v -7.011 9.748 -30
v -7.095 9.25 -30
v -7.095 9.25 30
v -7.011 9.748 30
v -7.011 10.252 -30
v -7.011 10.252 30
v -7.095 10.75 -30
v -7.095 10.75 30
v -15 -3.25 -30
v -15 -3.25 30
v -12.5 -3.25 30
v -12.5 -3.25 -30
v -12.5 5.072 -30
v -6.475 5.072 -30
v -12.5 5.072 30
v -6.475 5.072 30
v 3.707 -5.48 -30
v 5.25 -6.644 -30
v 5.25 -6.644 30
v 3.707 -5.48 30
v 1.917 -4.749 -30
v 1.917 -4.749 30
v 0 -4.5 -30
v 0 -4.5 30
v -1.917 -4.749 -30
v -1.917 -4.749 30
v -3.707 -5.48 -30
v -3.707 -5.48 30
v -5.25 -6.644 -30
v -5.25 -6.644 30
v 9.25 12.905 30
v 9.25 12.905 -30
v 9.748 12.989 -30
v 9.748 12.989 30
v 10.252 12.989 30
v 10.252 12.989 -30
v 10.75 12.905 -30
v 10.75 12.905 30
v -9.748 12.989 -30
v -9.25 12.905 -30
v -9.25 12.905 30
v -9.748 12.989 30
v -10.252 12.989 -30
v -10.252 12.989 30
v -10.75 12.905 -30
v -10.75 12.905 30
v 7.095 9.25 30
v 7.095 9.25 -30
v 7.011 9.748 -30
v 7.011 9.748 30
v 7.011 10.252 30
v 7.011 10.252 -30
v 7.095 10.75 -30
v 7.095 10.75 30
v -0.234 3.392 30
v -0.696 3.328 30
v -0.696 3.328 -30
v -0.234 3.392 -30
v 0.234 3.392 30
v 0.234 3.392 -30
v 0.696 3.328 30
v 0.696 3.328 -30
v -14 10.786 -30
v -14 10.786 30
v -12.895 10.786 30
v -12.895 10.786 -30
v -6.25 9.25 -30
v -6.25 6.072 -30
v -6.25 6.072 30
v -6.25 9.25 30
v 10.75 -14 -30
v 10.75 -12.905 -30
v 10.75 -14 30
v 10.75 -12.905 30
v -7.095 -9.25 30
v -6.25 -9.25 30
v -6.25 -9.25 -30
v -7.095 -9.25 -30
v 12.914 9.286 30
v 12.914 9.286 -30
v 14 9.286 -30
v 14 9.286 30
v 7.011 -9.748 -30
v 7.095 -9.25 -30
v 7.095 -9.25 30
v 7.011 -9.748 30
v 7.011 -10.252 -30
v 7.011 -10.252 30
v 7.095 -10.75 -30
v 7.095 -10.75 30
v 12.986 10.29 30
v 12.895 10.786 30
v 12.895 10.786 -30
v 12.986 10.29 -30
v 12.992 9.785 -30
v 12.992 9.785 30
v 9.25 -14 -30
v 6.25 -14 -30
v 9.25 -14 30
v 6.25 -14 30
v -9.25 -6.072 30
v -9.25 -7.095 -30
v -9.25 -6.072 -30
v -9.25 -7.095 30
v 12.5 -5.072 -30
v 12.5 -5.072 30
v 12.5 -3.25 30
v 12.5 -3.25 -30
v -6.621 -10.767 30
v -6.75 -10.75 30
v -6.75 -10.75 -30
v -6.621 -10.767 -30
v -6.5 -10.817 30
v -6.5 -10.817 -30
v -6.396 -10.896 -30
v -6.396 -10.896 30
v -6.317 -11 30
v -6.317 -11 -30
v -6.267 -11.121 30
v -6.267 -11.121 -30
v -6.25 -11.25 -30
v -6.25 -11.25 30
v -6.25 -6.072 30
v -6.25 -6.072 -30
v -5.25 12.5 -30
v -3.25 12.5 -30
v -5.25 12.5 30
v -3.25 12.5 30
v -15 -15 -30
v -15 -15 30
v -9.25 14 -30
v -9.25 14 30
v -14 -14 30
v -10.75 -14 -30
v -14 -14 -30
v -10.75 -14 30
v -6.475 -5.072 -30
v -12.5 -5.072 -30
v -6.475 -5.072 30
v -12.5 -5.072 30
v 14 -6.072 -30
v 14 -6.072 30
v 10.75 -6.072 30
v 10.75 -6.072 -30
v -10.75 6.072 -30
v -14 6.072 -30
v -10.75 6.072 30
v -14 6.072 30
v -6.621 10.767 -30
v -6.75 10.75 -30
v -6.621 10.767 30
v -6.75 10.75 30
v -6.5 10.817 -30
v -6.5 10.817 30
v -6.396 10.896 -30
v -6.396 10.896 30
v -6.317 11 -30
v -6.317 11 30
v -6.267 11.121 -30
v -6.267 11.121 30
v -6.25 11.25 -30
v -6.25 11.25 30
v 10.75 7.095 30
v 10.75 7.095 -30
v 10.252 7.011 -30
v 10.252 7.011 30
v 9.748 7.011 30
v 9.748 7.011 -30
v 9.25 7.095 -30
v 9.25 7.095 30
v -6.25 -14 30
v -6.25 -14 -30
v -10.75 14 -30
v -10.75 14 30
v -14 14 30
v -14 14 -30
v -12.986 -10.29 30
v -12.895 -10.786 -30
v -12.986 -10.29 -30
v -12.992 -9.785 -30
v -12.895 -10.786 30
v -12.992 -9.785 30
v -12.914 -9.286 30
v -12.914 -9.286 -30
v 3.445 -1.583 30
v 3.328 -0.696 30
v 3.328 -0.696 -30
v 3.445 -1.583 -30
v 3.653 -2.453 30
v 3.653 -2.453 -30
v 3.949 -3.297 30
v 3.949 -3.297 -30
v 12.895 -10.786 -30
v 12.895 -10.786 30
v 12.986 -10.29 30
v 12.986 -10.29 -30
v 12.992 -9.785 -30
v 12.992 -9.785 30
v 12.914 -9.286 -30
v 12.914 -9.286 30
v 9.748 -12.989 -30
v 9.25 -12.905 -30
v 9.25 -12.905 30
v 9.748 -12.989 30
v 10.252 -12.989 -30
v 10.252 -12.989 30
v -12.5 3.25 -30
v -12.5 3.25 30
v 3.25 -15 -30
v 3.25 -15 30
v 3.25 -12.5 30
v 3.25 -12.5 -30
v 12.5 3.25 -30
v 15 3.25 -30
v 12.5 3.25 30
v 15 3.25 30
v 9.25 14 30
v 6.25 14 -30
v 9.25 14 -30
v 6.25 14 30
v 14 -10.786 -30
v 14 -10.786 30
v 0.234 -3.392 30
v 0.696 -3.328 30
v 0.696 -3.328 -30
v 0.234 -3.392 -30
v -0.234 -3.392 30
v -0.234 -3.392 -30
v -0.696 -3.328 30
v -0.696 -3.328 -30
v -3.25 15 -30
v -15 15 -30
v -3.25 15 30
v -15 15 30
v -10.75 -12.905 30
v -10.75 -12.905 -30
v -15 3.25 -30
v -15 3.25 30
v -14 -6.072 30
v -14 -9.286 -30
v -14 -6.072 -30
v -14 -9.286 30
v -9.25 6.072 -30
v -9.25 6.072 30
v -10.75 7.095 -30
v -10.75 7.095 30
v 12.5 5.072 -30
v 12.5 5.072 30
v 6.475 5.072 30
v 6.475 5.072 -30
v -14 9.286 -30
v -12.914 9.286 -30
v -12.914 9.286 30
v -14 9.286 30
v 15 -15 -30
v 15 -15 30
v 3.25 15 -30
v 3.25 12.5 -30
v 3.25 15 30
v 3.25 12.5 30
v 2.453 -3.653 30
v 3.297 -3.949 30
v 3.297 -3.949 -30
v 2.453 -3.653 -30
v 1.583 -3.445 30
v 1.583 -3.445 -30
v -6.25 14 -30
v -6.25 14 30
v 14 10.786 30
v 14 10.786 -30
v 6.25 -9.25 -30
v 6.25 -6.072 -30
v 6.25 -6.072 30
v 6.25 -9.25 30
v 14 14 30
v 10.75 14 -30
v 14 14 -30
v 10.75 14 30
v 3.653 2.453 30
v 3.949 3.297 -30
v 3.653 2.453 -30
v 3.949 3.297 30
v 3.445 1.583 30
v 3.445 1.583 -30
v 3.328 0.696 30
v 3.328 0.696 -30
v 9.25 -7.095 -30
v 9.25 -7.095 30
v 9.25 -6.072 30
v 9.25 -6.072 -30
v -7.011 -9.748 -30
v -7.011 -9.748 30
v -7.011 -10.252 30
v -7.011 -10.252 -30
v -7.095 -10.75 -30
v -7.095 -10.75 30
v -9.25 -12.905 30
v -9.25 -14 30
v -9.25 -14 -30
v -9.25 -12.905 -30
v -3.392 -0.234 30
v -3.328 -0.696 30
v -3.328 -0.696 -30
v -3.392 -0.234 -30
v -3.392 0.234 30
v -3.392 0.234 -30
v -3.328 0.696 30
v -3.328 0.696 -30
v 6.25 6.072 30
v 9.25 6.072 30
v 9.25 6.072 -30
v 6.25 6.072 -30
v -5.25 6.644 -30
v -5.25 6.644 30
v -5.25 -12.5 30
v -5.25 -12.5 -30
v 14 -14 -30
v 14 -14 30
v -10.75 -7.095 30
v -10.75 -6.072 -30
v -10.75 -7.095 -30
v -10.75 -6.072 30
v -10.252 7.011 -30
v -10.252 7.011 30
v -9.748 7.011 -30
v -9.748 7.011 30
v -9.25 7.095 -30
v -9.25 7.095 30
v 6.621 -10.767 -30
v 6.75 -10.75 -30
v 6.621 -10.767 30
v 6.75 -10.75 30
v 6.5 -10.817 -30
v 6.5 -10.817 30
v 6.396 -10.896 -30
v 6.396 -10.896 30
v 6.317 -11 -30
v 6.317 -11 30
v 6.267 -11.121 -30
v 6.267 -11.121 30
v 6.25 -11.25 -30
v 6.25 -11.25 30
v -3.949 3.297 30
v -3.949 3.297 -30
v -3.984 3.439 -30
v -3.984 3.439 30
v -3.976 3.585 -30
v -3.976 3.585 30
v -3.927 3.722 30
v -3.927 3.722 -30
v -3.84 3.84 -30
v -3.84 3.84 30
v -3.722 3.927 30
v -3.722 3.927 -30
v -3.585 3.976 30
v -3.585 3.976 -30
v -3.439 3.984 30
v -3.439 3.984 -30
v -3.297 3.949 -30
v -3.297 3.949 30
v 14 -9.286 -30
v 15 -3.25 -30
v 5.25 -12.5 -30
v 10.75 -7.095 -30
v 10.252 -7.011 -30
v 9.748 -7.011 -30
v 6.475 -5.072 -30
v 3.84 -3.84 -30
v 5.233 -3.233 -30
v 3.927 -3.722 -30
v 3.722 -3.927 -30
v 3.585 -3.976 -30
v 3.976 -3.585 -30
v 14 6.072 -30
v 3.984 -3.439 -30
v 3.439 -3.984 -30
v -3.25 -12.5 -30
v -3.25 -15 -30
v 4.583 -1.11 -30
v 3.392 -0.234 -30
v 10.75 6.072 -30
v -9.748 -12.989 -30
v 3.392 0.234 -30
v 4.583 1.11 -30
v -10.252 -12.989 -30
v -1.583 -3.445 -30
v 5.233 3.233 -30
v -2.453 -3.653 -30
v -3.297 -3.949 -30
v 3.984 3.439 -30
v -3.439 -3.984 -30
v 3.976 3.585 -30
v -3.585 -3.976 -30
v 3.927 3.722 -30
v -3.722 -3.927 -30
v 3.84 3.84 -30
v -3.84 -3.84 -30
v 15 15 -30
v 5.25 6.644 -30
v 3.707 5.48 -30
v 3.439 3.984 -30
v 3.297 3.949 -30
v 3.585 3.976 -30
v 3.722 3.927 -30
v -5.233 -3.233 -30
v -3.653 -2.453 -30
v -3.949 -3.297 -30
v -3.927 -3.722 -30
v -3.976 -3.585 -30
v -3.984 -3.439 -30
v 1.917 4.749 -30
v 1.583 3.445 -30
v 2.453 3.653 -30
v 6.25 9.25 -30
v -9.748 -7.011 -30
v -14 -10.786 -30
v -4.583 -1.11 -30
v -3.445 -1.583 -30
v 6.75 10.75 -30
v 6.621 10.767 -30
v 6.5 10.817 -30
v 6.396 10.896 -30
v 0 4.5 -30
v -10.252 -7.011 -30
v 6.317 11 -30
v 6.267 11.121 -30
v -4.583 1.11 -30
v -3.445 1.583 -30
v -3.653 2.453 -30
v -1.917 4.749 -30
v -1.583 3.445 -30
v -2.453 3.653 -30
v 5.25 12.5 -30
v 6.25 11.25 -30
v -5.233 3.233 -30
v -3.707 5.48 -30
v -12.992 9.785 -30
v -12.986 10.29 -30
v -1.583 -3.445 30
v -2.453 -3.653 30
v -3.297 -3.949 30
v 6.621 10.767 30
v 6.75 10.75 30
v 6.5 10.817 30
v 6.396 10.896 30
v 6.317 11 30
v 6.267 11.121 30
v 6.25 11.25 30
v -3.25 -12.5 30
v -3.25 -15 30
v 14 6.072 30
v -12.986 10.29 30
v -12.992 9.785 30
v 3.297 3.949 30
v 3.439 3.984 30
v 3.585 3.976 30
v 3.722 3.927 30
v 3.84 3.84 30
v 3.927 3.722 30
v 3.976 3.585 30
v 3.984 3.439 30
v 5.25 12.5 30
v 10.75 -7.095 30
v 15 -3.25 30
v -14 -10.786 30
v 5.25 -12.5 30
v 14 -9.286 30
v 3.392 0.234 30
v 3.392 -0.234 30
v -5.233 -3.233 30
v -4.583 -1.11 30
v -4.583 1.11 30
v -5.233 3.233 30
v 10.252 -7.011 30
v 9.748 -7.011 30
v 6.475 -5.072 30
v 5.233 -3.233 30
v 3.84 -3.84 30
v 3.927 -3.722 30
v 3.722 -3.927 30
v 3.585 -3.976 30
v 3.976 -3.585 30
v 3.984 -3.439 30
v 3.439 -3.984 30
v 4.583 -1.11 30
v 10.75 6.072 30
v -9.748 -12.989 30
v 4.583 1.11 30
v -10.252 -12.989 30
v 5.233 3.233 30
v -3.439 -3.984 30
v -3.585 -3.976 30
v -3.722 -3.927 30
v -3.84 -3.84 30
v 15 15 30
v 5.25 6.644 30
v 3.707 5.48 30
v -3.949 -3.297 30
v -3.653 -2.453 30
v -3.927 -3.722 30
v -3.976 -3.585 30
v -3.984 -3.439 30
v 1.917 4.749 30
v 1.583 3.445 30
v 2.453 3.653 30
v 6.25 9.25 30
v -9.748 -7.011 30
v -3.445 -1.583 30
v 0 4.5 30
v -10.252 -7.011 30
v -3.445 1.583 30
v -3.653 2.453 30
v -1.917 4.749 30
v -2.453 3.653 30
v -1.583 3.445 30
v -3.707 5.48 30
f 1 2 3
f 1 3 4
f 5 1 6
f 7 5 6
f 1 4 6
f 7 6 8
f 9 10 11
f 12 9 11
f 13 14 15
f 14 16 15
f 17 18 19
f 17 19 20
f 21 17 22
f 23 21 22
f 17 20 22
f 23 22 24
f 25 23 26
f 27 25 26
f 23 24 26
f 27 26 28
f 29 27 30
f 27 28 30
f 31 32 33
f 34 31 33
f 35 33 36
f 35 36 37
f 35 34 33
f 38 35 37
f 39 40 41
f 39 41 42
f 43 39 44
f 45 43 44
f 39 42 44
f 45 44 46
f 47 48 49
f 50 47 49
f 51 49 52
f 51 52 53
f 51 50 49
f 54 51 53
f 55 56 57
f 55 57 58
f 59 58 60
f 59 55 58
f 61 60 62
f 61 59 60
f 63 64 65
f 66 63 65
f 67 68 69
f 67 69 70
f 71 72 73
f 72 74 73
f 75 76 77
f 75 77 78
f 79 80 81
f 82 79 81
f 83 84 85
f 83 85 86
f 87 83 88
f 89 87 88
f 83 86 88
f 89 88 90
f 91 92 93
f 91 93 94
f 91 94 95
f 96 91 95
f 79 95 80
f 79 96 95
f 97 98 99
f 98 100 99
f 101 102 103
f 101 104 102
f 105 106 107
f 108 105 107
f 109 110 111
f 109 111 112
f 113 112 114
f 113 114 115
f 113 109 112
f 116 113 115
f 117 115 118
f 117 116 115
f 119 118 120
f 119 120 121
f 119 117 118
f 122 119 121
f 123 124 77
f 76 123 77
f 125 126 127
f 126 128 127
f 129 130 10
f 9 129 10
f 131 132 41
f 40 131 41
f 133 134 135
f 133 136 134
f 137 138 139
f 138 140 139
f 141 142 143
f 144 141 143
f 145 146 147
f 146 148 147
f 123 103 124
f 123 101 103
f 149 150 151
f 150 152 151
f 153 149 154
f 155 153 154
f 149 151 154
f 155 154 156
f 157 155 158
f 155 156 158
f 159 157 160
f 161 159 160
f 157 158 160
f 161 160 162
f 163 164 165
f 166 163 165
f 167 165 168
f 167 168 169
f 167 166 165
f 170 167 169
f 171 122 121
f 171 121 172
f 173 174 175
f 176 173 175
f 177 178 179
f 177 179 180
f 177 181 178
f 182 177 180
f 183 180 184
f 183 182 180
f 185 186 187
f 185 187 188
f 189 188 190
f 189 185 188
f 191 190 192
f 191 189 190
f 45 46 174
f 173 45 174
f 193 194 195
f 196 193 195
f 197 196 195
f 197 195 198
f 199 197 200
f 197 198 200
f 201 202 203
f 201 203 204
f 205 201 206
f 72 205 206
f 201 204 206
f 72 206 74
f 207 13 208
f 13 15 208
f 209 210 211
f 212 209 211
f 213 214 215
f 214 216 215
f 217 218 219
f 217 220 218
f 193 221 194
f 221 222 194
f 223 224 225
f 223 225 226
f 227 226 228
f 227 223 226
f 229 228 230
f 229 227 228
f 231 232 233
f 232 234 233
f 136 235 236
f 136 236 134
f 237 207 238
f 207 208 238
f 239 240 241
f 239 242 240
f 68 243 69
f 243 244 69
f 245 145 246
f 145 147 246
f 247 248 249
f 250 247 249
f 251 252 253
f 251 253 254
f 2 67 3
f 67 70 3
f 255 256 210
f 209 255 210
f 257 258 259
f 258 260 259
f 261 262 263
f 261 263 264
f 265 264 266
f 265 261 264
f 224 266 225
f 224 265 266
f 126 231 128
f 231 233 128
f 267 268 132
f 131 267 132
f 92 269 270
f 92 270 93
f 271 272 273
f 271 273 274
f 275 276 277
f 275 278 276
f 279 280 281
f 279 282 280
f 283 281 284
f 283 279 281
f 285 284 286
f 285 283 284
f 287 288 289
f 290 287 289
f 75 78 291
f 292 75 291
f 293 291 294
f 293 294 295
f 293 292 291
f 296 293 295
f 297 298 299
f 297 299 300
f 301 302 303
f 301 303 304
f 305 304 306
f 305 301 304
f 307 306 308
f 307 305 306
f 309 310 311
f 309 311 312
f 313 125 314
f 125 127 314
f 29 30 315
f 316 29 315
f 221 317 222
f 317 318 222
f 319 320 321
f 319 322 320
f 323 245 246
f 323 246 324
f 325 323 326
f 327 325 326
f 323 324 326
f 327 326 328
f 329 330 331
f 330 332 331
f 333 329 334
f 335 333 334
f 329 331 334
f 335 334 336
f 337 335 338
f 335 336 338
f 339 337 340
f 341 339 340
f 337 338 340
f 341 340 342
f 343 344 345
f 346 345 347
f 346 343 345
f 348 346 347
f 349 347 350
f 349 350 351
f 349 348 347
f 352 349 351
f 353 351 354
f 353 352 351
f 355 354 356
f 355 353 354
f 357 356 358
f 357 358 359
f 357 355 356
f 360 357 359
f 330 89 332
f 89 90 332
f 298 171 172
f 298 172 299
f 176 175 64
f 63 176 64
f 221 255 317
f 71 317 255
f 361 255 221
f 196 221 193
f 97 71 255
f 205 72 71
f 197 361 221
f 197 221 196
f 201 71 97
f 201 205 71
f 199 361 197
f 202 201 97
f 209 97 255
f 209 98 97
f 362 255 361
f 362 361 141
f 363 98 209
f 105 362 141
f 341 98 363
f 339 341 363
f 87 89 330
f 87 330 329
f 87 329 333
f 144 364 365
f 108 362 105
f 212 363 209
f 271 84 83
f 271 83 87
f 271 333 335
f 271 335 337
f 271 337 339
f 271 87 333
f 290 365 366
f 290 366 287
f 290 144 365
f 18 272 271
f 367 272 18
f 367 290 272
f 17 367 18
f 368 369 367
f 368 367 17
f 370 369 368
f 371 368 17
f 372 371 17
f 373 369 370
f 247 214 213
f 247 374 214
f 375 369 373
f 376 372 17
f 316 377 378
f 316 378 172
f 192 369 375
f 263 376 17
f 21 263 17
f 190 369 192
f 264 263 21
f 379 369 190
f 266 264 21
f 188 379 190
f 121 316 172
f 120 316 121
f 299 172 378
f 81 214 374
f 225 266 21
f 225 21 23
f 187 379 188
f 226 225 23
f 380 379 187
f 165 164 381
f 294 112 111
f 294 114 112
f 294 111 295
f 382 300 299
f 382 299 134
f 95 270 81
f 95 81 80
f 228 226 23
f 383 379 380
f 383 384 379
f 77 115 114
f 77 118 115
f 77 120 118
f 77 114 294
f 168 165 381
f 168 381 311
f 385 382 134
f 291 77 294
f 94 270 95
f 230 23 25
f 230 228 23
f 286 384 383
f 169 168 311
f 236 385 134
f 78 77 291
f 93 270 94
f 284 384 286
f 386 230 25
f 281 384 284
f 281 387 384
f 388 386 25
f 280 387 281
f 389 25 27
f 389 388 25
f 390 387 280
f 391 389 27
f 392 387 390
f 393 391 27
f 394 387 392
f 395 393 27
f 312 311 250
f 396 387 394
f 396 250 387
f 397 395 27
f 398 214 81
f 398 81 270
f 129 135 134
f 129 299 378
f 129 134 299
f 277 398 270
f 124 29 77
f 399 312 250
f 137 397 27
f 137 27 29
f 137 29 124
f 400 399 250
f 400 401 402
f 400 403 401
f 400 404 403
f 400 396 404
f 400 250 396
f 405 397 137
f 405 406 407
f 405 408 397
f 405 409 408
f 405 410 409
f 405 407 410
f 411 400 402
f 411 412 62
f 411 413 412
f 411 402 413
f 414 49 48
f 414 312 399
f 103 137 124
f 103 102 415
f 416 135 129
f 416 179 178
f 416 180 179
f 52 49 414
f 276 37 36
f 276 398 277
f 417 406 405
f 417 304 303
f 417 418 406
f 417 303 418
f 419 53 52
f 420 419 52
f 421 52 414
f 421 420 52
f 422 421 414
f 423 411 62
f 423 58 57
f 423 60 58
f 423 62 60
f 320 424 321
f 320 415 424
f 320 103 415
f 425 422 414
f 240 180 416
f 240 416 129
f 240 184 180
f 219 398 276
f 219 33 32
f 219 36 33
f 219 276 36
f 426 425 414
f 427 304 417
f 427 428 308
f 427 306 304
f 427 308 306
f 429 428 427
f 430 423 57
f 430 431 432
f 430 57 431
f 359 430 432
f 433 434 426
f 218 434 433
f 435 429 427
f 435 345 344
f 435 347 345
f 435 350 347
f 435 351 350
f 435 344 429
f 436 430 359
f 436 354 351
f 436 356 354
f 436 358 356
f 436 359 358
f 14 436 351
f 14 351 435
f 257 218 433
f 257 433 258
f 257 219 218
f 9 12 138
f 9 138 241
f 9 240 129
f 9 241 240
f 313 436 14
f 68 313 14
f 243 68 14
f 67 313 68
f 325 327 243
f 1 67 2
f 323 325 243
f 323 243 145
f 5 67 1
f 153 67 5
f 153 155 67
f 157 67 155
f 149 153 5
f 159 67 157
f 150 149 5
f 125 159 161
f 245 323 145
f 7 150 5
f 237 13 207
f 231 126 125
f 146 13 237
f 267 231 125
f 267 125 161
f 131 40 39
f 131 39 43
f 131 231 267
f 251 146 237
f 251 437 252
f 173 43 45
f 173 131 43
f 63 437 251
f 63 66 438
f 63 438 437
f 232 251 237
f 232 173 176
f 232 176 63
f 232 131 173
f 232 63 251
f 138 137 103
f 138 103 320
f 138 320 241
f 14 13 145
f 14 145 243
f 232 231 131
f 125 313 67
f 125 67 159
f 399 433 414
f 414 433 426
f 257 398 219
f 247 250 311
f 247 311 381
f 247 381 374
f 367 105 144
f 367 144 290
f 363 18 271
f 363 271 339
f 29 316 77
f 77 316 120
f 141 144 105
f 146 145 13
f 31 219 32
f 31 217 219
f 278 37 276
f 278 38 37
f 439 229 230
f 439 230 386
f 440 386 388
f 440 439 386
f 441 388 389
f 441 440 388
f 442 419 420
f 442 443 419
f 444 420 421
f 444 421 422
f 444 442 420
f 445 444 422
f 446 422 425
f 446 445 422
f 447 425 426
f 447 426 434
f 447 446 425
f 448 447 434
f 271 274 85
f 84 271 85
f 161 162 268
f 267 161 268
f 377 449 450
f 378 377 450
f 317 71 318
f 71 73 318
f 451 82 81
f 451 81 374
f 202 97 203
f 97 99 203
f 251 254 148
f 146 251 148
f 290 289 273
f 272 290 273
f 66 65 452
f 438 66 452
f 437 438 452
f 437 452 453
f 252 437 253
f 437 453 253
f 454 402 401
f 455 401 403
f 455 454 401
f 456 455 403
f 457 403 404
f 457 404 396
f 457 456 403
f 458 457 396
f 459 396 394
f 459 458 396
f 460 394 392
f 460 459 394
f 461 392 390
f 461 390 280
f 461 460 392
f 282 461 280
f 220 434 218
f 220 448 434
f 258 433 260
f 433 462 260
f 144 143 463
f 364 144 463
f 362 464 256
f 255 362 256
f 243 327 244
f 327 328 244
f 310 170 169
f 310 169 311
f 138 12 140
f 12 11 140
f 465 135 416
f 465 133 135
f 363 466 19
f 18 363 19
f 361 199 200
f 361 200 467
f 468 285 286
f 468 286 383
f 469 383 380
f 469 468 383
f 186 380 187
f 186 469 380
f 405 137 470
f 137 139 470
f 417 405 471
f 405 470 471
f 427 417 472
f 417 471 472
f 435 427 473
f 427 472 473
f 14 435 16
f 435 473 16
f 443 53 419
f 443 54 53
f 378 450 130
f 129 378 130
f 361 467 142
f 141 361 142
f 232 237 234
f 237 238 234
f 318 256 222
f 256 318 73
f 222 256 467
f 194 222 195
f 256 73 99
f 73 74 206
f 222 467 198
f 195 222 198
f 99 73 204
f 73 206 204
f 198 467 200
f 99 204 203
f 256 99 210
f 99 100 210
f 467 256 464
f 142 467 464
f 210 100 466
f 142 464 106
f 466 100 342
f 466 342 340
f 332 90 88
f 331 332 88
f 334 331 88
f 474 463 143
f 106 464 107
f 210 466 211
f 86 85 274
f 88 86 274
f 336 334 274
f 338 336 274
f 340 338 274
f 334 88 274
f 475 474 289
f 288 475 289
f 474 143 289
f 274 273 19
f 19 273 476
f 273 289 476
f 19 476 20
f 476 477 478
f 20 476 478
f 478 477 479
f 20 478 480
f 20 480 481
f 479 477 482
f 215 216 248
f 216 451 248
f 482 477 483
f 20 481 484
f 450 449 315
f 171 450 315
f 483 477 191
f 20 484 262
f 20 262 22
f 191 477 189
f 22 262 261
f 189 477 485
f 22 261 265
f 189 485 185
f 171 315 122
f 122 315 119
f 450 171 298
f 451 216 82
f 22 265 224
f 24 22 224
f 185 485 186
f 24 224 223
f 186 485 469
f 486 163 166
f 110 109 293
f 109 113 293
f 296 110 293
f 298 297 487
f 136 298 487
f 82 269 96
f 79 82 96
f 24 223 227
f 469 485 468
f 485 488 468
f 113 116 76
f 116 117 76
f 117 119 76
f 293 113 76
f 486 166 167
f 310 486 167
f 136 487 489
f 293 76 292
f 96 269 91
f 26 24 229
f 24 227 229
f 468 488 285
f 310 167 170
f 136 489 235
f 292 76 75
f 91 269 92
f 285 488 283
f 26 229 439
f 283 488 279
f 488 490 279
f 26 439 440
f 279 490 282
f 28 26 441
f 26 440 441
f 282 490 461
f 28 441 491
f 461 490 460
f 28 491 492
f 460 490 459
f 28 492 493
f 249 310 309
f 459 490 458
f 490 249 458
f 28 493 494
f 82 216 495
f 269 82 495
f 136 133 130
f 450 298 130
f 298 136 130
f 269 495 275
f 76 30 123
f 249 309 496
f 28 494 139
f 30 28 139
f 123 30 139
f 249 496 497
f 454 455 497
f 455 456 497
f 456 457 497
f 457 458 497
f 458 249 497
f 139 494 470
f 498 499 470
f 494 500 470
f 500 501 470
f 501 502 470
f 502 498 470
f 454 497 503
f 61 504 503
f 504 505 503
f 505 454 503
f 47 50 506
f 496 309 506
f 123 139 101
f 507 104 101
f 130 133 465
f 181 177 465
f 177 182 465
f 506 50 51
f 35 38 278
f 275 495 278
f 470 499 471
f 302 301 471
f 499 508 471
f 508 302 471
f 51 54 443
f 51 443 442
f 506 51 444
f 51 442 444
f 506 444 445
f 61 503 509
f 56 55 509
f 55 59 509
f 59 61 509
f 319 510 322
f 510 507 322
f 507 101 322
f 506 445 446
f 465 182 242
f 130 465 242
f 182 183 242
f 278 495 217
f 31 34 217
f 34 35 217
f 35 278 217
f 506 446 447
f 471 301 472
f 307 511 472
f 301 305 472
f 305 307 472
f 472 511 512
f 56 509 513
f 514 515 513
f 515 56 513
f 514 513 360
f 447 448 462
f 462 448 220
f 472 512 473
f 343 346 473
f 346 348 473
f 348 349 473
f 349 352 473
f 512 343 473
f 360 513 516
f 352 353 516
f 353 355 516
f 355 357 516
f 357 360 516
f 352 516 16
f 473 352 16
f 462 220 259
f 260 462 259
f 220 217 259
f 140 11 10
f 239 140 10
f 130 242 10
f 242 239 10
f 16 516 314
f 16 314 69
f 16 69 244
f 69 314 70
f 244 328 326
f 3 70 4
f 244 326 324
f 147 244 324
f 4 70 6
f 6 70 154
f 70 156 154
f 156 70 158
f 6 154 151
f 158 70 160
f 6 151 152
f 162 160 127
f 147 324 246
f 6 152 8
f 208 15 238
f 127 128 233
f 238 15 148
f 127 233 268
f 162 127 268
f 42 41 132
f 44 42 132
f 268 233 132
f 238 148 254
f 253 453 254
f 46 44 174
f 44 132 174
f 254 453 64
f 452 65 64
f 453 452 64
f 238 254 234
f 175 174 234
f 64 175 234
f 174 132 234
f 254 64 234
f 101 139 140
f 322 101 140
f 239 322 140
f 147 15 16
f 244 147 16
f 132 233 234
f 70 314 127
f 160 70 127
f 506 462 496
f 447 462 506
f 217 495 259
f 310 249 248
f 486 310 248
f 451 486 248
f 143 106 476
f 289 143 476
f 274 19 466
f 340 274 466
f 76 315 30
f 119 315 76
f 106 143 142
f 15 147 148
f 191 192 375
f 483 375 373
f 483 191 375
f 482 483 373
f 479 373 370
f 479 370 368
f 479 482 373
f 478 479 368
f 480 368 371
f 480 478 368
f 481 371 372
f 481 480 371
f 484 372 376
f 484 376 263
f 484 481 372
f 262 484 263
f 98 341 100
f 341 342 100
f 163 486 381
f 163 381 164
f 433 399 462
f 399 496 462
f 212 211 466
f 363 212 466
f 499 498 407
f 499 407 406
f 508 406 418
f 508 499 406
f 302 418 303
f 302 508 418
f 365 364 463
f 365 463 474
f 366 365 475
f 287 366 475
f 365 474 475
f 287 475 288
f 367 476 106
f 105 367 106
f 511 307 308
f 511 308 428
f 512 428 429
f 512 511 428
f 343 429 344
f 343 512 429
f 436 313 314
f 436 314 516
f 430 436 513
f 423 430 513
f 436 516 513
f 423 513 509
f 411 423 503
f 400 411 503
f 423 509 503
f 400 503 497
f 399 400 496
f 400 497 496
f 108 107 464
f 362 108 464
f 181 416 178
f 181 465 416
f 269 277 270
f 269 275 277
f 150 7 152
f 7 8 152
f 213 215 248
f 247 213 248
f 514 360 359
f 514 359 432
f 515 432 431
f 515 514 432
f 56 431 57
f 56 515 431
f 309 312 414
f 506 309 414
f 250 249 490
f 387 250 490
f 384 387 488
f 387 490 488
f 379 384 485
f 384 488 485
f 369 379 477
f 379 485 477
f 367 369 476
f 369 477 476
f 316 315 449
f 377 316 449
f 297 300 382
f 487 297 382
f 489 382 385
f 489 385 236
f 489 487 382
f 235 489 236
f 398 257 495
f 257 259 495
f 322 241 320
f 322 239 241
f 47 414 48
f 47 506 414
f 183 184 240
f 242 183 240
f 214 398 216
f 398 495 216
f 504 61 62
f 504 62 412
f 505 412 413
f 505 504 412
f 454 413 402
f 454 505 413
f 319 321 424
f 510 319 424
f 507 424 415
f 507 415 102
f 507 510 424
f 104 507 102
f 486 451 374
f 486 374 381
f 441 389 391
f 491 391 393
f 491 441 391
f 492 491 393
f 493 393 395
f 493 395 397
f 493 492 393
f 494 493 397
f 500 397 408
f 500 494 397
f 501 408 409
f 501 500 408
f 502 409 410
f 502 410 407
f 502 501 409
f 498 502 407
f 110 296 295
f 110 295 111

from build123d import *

# Parameters (mm, degrees)
EXTRUDE_1_DEPTH = 30


with BuildPart() as part:
    # 草圖1 → 擠出1 (new, symmetric)
    with BuildSketch(Plane.XY):
        with BuildLine():
            Line((-15, -3.25), (-12.5, -3.25))
            Line((-12.5, -3.25), (-12.5, -5.072439755))
            Line((-12.5, -5.072439755), (-6.47547695, -5.072439755))
            ThreePointArc((-6.47547695, -5.072439755), (-4.5, 0), (-6.47547695, 5.072439755))
            Line((-6.47547695, 5.072439755), (-12.5, 5.072439755))
            Line((-12.5, 5.072439755), (-12.5, 3.25))
            Line((-12.5, 3.25), (-15, 3.25))
            Line((-15, 3.25), (-15, 15))
            Line((-15, 15), (-3.25, 15))
            Line((-3.25, 15), (-3.25, 12.5))
            Line((-3.25, 12.5), (-5.25, 12.5))
            Line((-5.25, 12.5), (-5.25, 6.643928679))
            ThreePointArc((-5.25, 6.643928679), (0, 4.5), (5.25, 6.643928679))
            Line((5.25, 6.643928679), (5.25, 12.5))
            Line((5.25, 12.5), (3.25, 12.5))
            Line((3.25, 12.5), (3.25, 15))
            Line((3.25, 15), (15, 15))
            Line((15, 15), (15, 3.25))
            Line((15, 3.25), (12.5, 3.25))
            Line((12.5, 3.25), (12.5, 5.072439755))
            Line((12.5, 5.072439755), (6.47547695, 5.072439755))
            ThreePointArc((6.47547695, 5.072439755), (4.5, 0), (6.47547695, -5.072439755))
            Line((6.47547695, -5.072439755), (12.5, -5.072439755))
            Line((12.5, -5.072439755), (12.5, -3.25))
            Line((12.5, -3.25), (15, -3.25))
            Line((15, -3.25), (15, -15))
            Line((15, -15), (3.25, -15))
            Line((3.25, -15), (3.25, -12.5))
            Line((3.25, -12.5), (5.25, -12.5))
            Line((5.25, -12.5), (5.25, -6.643928679))
            ThreePointArc((5.25, -6.643928679), (0, -4.5), (-5.25, -6.643928679))
            Line((-5.25, -6.643928679), (-5.25, -12.5))
            Line((-5.25, -12.5), (-3.25, -12.5))
            Line((-3.25, -12.5), (-3.25, -15))
            Line((-3.25, -15), (-15, -15))
            Line((-15, -15), (-15, -3.25))
        make_face()
        with BuildLine():
            Line((-9.25, -6.072439755), (-6.25, -6.072439755))
            Line((-6.25, -6.072439755), (-6.25, -9.25))
            Line((-6.25, -9.25), (-7.09526249, -9.25))
            ThreePointArc((-7.09526249, -9.25), (-7, -10), (-7.09526249, -10.75))
            Line((-7.09526249, -10.75), (-6.75, -10.75))
            ThreePointArc((-6.75, -10.75), (-6.396446609, -10.896446609), (-6.25, -11.25))
            Line((-6.25, -11.25), (-6.25, -14))
            Line((-6.25, -14), (-9.25, -14))
            Line((-9.25, -14), (-9.25, -12.90473751))
            ThreePointArc((-9.25, -12.90473751), (-10, -13), (-10.75, -12.90473751))
            Line((-10.75, -12.90473751), (-10.75, -14))
            Line((-10.75, -14), (-14, -14))
            Line((-14, -14), (-14, -10.786219878))
            Line((-14, -10.786219878), (-12.895143918, -10.786219878))
            ThreePointArc((-12.895143918, -10.786219878), (-12.999766765, -10.037407923), (-12.913849333, -9.286219878))
            Line((-12.913849333, -9.286219878), (-14, -9.286219878))
            Line((-14, -9.286219878), (-14, -6.072439755))
            Line((-14, -6.072439755), (-10.75, -6.072439755))
            Line((-10.75, -6.072439755), (-10.75, -7.09526249))
            ThreePointArc((-10.75, -7.09526249), (-10, -7), (-9.25, -7.09526249))
            Line((-9.25, -7.09526249), (-9.25, -6.072439755))
        make_face(mode=Mode.SUBTRACT)
        with BuildLine():
            Line((-14, 6.072439755), (-10.75, 6.072439755))
            Line((-10.75, 6.072439755), (-10.75, 7.09526249))
            ThreePointArc((-10.75, 7.09526249), (-10, 7), (-9.25, 7.09526249))
            Line((-9.25, 7.09526249), (-9.25, 6.072439755))
            Line((-9.25, 6.072439755), (-6.25, 6.072439755))
            Line((-6.25, 6.072439755), (-6.25, 9.25))
            Line((-6.25, 9.25), (-7.09526249, 9.25))
            ThreePointArc((-7.09526249, 9.25), (-7, 10), (-7.09526249, 10.75))
            Line((-7.09526249, 10.75), (-6.75, 10.75))
            ThreePointArc((-6.75, 10.75), (-6.396446609, 10.896446609), (-6.25, 11.25))
            Line((-6.25, 11.25), (-6.25, 14))
            Line((-6.25, 14), (-9.25, 14))
            Line((-9.25, 14), (-9.25, 12.90473751))
            ThreePointArc((-9.25, 12.90473751), (-10, 13), (-10.75, 12.90473751))
            Line((-10.75, 12.90473751), (-10.75, 14))
            Line((-10.75, 14), (-14, 14))
            Line((-14, 14), (-14, 10.786219878))
            Line((-14, 10.786219878), (-12.895143918, 10.786219878))
            ThreePointArc((-12.895143918, 10.786219878), (-12.999766765, 10.037407923), (-12.913849333, 9.286219878))
            Line((-12.913849333, 9.286219878), (-14, 9.286219878))
            Line((-14, 9.286219878), (-14, 6.072439755))
        make_face(mode=Mode.SUBTRACT)
        with BuildLine():
            Line((14, 14), (14, 10.786219878))
            Line((14, 10.786219878), (12.895143918, 10.786219878))
            ThreePointArc((12.895143918, 10.786219878), (12.999766765, 10.037407923), (12.913849333, 9.286219878))
            Line((12.913849333, 9.286219878), (14, 9.286219878))
            Line((14, 9.286219878), (14, 6.072439755))
            Line((14, 6.072439755), (10.75, 6.072439755))
            Line((10.75, 6.072439755), (10.75, 7.09526249))
            ThreePointArc((10.75, 7.09526249), (10, 7), (9.25, 7.09526249))
            Line((9.25, 7.09526249), (9.25, 6.072439755))
            Line((9.25, 6.072439755), (6.25, 6.072439755))
            Line((6.25, 6.072439755), (6.25, 9.25))
            Line((6.25, 9.25), (7.09526249, 9.25))
            ThreePointArc((7.09526249, 9.25), (7, 10), (7.09526249, 10.75))
            Line((7.09526249, 10.75), (6.75, 10.75))
            ThreePointArc((6.75, 10.75), (6.396446609, 10.896446609), (6.25, 11.25))
            Line((6.25, 11.25), (6.25, 14))
            Line((6.25, 14), (9.25, 14))
            Line((9.25, 14), (9.25, 12.90473751))
            ThreePointArc((9.25, 12.90473751), (10, 13), (10.75, 12.90473751))
            Line((10.75, 12.90473751), (10.75, 14))
            Line((10.75, 14), (14, 14))
        make_face(mode=Mode.SUBTRACT)
        with BuildLine():
            Line((7.09526249, -10.75), (6.75, -10.75))
            ThreePointArc((6.75, -10.75), (6.396446609, -10.896446609), (6.25, -11.25))
            Line((6.25, -11.25), (6.25, -14))
            Line((6.25, -14), (9.25, -14))
            Line((9.25, -14), (9.25, -12.90473751))
            ThreePointArc((9.25, -12.90473751), (10, -13), (10.75, -12.90473751))
            Line((10.75, -12.90473751), (10.75, -14))
            Line((10.75, -14), (14, -14))
            Line((14, -14), (14, -10.786219878))
            Line((14, -10.786219878), (12.895143918, -10.786219878))
            ThreePointArc((12.895143918, -10.786219878), (12.999766765, -10.037407923), (12.913849333, -9.286219878))
            Line((12.913849333, -9.286219878), (14, -9.286219878))
            Line((14, -9.286219878), (14, -6.072439755))
            Line((14, -6.072439755), (10.75, -6.072439755))
            Line((10.75, -6.072439755), (10.75, -7.09526249))
            ThreePointArc((10.75, -7.09526249), (10, -7), (9.25, -7.09526249))
            Line((9.25, -7.09526249), (9.25, -6.072439755))
            Line((9.25, -6.072439755), (6.25, -6.072439755))
            Line((6.25, -6.072439755), (6.25, -9.25))
            Line((6.25, -9.25), (7.09526249, -9.25))
            ThreePointArc((7.09526249, -9.25), (7, -10), (7.09526249, -10.75))
        make_face(mode=Mode.SUBTRACT)
        with BuildLine():
            ThreePointArc((3.948754255, 3.296580342), (3.537868444, 2.020477551), (3.327916667, 0.696398348))
            ThreePointArc((3.327916667, 0.696398348), (3.4, 0), (3.327916667, -0.696398348))
            ThreePointArc((3.327916667, -0.696398348), (3.537868444, -2.020477551), (3.948754255, -3.296580342))
            ThreePointArc((3.948754255, -3.296580342), (3.839592373, -3.839592373), (3.296580342, -3.948754255))
            ThreePointArc((3.296580342, -3.948754255), (2.020477551, -3.537868444), (0.696398348, -3.327916667))
            ThreePointArc((0.696398348, -3.327916667), (0, -3.4), (-0.696398348, -3.327916667))
            ThreePointArc((-0.696398348, -3.327916667), (-2.020477551, -3.537868444), (-3.296580342, -3.948754255))
            ThreePointArc((-3.296580342, -3.948754255), (-3.839592373, -3.839592373), (-3.948754255, -3.296580342))
            ThreePointArc((-3.948754255, -3.296580342), (-3.537868444, -2.020477551), (-3.327916667, -0.696398348))
            ThreePointArc((-3.327916667, -0.696398348), (-3.4, 0), (-3.327916667, 0.696398348))
            ThreePointArc((-3.327916667, 0.696398348), (-3.537868444, 2.020477551), (-3.948754255, 3.296580342))
            ThreePointArc((-3.948754255, 3.296580342), (-3.839592373, 3.839592373), (-3.296580342, 3.948754255))
            ThreePointArc((-3.296580342, 3.948754255), (-2.020477551, 3.537868444), (-0.696398348, 3.327916667))
            ThreePointArc((-0.696398348, 3.327916667), (0, 3.4), (0.696398348, 3.327916667))
            ThreePointArc((0.696398348, 3.327916667), (2.020477551, 3.537868444), (3.296580342, 3.948754255))
            ThreePointArc((3.296580342, 3.948754255), (3.839592373, 3.839592373), (3.948754255, 3.296580342))
        make_face(mode=Mode.SUBTRACT)
    extrude(amount=EXTRUDE_1_DEPTH, both=True)


solid = part.part
